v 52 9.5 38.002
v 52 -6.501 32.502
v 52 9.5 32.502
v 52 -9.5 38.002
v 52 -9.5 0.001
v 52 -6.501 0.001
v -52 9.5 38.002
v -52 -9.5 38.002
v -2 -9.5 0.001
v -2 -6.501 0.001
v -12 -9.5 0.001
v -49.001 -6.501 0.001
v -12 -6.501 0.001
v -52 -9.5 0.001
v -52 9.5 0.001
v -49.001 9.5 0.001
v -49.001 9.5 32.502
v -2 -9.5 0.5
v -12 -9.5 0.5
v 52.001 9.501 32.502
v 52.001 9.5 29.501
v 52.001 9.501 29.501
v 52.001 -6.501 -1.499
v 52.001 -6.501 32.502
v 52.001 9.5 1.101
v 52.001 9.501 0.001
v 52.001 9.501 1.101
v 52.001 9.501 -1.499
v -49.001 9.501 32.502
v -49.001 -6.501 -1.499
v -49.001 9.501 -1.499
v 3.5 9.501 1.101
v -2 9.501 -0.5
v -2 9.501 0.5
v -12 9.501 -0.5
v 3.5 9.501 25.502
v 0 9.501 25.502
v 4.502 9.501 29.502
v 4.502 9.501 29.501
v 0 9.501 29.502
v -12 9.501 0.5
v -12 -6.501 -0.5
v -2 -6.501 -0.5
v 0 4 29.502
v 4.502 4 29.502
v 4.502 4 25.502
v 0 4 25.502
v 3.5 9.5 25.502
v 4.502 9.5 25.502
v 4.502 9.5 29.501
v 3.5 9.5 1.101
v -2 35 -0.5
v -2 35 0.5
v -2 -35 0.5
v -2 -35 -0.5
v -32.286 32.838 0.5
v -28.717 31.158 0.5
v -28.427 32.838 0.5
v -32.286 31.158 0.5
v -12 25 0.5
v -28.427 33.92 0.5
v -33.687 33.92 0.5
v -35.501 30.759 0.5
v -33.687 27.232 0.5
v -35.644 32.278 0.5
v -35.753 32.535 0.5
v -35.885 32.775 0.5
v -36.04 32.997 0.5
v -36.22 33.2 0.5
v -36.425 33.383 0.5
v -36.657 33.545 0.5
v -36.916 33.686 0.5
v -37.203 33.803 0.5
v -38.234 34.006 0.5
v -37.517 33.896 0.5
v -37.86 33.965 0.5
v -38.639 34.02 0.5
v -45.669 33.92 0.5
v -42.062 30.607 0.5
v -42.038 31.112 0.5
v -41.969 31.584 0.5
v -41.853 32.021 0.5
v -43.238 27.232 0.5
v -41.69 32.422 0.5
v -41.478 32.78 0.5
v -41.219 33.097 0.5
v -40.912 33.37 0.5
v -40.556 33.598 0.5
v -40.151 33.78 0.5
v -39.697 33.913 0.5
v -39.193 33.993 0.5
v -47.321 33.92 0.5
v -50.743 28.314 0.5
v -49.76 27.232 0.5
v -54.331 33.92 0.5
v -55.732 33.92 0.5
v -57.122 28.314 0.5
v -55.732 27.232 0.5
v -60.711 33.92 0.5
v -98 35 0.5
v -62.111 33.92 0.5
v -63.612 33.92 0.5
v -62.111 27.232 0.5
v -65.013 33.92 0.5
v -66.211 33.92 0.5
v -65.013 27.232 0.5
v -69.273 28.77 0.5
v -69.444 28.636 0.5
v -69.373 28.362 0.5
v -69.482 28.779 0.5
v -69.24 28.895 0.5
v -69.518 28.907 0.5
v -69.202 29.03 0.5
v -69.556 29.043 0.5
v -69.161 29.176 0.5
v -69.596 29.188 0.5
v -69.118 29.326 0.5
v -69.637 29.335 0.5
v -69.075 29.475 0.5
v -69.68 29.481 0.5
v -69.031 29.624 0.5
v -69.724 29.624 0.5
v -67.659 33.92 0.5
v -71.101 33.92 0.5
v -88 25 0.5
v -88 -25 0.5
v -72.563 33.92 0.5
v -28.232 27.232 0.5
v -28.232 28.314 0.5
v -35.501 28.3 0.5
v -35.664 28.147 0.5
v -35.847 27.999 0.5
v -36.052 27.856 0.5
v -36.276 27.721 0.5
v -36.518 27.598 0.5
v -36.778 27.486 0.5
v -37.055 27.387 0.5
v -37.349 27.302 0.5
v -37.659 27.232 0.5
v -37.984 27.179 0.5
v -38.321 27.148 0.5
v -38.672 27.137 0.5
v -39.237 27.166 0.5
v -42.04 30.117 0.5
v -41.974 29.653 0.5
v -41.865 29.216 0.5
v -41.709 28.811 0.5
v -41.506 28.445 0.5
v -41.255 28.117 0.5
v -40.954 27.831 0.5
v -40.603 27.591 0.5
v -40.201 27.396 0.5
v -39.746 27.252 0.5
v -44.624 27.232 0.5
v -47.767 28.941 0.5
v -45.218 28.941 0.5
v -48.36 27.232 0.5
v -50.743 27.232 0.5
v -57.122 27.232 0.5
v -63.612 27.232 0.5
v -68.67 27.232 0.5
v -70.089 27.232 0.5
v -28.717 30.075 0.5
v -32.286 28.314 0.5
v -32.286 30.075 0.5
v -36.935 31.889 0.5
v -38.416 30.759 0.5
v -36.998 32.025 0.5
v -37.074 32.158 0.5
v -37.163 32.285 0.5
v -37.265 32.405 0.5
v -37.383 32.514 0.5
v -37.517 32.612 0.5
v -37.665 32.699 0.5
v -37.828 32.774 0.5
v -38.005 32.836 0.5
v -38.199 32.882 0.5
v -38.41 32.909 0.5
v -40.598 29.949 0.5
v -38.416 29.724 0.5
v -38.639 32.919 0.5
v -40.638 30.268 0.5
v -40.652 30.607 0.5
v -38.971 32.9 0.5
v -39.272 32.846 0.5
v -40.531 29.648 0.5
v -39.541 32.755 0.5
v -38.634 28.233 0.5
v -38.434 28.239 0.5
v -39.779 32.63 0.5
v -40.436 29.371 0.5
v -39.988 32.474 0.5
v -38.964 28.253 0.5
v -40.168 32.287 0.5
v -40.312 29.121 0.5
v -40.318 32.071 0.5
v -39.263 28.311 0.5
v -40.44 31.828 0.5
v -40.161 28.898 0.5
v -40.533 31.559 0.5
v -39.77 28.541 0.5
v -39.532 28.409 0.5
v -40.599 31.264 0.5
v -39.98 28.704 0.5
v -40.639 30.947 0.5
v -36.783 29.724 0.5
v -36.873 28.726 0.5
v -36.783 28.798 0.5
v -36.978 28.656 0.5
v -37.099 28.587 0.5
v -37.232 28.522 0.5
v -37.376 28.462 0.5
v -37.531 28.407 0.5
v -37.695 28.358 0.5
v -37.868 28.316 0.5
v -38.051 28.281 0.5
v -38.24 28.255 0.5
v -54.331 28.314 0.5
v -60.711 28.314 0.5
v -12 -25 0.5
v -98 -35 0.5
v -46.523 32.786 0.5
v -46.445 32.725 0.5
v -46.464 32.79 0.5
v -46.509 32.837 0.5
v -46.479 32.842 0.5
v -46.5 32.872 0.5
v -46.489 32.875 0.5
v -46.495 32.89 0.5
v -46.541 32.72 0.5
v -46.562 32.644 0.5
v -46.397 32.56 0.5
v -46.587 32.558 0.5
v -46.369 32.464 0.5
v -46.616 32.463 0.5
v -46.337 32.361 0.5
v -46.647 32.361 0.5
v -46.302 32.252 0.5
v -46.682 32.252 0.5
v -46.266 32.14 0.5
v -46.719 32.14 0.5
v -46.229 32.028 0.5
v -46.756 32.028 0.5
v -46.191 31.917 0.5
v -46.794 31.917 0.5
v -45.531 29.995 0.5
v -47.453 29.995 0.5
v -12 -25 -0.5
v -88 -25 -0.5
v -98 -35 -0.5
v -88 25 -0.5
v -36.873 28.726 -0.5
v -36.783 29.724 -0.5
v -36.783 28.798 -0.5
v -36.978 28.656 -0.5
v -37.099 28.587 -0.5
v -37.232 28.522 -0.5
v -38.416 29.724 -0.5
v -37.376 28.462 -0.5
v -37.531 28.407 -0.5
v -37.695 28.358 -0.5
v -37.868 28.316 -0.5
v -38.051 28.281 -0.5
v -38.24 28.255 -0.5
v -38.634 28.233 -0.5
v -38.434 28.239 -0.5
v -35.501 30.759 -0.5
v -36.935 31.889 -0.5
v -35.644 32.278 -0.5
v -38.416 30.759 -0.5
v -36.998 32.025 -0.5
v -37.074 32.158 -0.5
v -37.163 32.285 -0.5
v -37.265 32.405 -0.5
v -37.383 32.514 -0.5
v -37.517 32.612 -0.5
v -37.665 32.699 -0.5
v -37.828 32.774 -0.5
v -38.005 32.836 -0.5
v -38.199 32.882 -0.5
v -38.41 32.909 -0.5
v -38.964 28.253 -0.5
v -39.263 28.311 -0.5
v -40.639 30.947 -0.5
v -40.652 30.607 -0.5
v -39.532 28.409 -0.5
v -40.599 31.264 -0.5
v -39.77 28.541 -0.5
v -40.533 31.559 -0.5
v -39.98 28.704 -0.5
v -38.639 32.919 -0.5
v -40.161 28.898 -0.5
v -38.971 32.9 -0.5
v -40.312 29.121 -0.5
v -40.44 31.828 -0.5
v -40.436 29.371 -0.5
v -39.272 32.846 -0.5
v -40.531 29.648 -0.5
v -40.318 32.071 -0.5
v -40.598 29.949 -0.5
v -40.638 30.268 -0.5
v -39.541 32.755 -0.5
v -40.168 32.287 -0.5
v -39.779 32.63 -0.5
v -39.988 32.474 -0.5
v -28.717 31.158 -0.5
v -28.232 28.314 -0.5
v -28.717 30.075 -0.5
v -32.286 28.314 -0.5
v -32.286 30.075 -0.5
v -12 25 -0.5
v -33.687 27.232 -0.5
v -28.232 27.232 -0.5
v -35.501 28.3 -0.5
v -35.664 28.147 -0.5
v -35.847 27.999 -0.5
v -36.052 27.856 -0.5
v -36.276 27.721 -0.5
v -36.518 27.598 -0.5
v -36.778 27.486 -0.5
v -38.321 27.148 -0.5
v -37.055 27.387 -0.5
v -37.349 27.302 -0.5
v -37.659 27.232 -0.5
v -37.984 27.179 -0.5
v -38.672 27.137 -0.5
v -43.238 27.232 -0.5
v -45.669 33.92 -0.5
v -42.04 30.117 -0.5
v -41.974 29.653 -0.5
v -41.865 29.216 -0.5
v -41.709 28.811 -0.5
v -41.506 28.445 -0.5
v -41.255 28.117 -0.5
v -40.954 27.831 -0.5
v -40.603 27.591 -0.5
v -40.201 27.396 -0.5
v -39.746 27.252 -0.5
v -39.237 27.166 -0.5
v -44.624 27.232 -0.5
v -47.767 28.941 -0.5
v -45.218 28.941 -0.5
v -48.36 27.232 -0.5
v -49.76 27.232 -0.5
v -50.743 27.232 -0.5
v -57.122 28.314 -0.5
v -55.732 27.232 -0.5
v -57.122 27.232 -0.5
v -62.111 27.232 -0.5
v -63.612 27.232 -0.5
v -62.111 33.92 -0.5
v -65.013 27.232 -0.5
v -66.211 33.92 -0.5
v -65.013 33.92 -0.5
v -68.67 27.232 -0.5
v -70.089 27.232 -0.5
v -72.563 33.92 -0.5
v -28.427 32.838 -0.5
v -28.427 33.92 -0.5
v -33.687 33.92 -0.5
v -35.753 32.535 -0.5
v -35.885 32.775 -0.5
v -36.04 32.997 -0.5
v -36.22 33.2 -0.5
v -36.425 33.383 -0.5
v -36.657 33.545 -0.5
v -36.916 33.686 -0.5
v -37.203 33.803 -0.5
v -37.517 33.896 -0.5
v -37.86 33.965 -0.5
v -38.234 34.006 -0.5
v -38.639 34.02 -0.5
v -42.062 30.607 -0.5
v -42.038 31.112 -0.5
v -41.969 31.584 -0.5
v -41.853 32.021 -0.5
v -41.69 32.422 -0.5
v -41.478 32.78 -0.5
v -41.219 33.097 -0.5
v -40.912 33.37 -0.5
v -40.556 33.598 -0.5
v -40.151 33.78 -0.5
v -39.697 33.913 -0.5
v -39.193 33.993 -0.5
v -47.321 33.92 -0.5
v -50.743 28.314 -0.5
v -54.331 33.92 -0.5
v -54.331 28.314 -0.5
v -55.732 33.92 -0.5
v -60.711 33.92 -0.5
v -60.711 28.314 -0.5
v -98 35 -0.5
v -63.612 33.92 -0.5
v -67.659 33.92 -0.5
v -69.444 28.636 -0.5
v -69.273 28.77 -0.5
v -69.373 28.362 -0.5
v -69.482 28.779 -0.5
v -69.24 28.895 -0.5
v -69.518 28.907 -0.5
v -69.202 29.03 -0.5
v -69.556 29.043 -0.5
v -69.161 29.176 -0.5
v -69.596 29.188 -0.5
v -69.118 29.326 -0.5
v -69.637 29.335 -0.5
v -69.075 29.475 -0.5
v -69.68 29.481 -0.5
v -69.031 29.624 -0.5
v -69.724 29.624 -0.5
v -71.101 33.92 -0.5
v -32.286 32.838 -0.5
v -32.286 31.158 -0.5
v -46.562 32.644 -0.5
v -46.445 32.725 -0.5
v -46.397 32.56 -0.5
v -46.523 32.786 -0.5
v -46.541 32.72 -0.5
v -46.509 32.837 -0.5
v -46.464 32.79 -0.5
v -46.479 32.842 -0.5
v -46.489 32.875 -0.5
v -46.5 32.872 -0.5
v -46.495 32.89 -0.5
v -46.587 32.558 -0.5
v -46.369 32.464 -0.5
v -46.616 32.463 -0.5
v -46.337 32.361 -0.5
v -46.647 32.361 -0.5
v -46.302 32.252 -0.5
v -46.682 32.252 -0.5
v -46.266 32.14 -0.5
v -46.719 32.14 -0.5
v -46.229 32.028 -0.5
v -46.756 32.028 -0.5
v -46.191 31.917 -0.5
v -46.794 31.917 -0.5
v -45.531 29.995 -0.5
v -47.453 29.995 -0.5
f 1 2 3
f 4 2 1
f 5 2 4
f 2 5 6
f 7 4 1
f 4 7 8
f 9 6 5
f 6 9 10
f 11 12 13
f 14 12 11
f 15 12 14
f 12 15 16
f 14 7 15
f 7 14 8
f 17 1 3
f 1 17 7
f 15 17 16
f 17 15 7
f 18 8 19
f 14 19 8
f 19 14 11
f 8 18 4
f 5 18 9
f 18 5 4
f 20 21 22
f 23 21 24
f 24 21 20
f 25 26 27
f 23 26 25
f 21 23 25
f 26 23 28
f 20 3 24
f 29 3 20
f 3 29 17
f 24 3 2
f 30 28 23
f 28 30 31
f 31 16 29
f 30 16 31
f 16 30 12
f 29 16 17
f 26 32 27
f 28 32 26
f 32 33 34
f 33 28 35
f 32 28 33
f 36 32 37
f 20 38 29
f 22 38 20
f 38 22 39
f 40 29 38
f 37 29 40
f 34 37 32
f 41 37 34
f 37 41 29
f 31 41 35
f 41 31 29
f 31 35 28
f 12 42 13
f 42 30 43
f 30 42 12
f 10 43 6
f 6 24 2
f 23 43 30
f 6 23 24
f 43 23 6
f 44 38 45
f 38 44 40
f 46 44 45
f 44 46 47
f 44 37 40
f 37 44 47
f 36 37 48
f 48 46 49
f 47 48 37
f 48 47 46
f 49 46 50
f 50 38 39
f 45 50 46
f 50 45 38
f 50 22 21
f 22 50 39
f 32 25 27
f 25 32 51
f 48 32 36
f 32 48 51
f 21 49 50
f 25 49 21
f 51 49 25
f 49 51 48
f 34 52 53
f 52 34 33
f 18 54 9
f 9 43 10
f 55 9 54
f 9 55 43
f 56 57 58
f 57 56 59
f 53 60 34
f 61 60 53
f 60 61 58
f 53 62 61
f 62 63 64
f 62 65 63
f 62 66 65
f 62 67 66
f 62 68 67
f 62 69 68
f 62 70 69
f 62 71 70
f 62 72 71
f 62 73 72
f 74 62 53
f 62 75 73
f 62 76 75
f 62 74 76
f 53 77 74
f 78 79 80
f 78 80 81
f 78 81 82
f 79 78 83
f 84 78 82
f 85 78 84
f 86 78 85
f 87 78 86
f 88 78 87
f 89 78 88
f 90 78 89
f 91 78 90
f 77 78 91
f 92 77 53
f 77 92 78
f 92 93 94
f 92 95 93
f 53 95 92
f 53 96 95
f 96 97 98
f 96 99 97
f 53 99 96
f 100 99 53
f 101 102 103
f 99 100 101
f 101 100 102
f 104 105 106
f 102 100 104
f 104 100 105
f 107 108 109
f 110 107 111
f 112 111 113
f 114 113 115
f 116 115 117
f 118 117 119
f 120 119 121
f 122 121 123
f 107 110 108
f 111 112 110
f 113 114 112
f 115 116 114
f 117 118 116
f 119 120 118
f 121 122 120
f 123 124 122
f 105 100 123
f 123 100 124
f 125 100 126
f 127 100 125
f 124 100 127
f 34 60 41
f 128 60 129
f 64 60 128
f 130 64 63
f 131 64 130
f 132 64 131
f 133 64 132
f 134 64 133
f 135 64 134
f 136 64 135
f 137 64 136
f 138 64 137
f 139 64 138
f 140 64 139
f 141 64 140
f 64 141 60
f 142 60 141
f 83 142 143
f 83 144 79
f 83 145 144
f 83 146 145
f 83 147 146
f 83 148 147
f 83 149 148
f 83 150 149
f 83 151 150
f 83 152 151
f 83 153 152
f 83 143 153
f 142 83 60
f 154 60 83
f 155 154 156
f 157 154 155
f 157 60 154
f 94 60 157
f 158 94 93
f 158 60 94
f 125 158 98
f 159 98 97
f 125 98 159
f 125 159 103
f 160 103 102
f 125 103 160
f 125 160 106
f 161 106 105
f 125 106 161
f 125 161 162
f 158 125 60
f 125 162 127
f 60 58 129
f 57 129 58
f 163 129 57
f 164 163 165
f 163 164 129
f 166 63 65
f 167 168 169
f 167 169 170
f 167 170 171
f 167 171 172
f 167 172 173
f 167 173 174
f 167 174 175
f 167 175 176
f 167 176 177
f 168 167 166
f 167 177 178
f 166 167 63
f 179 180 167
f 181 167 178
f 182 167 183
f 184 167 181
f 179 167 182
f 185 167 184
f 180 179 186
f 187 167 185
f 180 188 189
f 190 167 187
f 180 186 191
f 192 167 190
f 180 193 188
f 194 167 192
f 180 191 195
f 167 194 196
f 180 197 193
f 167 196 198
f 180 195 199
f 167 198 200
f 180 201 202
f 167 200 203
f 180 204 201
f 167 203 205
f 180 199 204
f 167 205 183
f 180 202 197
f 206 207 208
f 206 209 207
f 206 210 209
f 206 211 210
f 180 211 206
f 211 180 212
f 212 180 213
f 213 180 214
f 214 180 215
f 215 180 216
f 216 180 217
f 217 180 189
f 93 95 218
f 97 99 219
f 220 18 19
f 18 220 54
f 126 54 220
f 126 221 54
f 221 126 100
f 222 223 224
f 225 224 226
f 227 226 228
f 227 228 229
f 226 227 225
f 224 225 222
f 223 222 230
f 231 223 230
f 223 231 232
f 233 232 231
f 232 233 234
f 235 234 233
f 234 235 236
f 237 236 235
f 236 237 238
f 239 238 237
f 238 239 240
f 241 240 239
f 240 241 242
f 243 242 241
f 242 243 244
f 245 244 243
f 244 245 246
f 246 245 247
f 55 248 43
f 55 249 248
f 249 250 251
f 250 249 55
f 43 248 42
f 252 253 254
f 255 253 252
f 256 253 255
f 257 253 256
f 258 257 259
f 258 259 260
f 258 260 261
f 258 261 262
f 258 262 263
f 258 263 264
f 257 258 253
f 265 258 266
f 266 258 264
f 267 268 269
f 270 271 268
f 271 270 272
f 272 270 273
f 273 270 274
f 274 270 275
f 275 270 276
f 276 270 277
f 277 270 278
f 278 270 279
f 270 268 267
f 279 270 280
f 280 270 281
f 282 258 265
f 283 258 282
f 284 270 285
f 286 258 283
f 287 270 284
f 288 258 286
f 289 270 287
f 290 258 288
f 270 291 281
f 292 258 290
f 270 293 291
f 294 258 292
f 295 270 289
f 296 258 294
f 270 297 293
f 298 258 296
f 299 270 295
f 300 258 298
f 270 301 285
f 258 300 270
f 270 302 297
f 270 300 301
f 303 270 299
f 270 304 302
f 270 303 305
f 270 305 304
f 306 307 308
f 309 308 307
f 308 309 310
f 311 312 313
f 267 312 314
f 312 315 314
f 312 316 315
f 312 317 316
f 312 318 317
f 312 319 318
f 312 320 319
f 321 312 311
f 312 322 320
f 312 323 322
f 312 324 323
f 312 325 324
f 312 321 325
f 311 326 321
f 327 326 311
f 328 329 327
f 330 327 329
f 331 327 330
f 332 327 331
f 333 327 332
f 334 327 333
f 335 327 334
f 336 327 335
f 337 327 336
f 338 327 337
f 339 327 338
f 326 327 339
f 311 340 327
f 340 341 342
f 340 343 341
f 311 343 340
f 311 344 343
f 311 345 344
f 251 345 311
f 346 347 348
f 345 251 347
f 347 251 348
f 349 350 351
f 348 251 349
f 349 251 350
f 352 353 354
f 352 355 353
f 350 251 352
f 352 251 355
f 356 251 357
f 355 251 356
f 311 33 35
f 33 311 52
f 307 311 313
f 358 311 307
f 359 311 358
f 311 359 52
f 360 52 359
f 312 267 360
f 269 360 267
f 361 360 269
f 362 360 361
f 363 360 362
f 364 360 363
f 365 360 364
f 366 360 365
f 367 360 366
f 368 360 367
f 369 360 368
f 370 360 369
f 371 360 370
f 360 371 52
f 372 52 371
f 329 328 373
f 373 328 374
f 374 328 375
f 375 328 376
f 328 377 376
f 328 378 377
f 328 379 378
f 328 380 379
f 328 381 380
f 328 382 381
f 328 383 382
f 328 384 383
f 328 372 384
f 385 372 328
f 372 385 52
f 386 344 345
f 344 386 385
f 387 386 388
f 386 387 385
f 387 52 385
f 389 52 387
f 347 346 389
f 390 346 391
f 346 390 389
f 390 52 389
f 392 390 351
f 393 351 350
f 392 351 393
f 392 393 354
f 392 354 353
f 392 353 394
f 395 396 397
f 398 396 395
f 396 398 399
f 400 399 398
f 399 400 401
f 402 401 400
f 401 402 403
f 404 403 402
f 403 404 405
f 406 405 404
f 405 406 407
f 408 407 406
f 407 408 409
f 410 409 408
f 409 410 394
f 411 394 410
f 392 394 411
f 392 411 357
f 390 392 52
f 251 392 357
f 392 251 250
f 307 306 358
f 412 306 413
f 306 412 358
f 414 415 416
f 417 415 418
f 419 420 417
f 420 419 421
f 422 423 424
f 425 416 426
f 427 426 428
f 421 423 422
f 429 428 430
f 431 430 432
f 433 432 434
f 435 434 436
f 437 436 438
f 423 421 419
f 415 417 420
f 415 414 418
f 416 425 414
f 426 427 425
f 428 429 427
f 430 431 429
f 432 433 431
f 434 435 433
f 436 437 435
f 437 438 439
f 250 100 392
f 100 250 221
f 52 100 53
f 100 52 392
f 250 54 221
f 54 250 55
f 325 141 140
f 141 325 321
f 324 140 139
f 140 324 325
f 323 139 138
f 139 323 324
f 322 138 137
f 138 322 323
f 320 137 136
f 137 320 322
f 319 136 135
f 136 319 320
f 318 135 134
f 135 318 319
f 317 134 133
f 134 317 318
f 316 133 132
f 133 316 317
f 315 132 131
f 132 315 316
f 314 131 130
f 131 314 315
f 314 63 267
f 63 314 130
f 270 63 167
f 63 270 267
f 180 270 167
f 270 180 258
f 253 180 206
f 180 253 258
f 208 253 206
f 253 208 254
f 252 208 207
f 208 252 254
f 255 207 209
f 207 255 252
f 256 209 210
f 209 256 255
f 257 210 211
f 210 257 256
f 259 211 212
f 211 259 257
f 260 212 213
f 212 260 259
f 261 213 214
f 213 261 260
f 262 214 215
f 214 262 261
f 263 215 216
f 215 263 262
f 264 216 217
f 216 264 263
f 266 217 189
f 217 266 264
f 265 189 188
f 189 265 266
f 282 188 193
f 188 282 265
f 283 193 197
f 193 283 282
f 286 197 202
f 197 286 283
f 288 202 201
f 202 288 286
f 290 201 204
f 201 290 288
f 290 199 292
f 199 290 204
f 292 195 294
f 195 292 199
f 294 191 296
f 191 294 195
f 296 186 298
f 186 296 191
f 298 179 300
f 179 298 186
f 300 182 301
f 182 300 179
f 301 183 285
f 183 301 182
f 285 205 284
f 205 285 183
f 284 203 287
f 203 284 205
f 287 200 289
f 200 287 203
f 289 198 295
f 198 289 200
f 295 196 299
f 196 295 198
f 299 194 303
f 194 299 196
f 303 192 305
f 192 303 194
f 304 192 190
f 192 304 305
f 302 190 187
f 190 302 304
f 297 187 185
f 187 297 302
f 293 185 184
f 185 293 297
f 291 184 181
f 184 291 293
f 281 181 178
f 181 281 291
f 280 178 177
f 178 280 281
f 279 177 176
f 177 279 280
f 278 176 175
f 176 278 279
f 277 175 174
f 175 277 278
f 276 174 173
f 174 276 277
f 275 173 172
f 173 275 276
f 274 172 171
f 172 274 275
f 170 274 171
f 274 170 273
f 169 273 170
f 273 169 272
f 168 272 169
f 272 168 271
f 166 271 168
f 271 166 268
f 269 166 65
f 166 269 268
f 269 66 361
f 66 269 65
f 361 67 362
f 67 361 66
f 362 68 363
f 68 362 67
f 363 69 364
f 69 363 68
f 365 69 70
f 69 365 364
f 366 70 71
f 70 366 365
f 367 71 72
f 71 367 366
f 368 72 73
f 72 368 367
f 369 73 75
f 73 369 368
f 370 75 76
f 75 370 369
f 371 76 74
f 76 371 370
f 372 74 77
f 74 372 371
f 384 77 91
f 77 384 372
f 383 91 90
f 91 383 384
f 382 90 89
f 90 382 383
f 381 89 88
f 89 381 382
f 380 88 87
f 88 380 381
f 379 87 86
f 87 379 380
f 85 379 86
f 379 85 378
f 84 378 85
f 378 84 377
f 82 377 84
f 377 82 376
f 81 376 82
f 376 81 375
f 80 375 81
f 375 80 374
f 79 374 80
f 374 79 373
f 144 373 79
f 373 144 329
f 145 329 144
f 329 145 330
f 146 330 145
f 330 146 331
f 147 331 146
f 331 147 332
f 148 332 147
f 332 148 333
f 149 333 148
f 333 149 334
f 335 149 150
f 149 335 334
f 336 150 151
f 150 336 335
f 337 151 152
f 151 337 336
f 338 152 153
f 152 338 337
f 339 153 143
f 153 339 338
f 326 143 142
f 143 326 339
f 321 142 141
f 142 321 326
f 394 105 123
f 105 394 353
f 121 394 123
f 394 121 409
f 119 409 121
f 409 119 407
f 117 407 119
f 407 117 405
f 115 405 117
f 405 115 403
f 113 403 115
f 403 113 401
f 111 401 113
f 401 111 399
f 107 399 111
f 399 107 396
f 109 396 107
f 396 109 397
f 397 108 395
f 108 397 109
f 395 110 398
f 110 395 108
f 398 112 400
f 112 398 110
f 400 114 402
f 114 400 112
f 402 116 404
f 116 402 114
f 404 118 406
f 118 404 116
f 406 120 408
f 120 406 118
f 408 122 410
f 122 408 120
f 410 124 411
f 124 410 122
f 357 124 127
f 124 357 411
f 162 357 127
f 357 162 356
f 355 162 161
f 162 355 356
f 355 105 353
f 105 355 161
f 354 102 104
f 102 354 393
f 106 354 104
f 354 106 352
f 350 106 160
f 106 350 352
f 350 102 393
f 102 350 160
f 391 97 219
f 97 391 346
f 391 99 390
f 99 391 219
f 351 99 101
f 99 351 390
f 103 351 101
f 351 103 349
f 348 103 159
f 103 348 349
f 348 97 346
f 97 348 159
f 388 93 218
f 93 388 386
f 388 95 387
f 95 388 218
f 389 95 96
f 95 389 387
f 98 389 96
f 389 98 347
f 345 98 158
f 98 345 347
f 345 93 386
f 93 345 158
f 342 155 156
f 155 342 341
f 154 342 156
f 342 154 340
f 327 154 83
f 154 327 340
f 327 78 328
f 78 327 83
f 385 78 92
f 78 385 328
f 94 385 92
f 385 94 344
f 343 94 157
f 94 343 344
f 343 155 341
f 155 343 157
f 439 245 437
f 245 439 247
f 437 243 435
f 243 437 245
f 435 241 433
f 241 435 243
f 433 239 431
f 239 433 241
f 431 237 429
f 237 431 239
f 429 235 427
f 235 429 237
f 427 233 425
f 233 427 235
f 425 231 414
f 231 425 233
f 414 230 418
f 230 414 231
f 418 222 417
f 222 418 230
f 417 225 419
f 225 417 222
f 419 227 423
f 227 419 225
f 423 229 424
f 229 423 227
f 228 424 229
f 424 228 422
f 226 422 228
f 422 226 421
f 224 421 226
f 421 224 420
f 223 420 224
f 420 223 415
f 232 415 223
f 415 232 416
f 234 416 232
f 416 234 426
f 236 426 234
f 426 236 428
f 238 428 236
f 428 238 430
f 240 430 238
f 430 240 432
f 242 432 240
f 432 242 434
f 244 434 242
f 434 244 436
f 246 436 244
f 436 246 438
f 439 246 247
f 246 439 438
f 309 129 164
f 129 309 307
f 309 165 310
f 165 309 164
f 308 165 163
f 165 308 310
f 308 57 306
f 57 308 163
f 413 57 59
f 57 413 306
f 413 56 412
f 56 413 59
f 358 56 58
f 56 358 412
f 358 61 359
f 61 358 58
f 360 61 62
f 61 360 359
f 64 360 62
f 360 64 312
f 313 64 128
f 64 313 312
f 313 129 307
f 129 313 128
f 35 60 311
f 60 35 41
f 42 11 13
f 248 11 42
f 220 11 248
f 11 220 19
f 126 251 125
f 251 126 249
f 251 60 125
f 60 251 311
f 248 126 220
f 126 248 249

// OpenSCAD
use <BOSL2/std.scad>

use <primitives/prisms.scad>
use <primitives/boxes.scad>

eps=0.001;

//main box params
width = 95;
depth = 10;
wall_thickness = 1.5;
chamfer=2.0;
outer_wall_thickness=wall_thickness;
inner_wall_thickness=outer_wall_thickness*2;

bottom_height =35;
bottom_outer_height=bottom_height;
bottom_inner_height = bottom_outer_height*0.8;

lid_height = 20;
lid_outer_height= lid_height;
lid_inner_height = lid_outer_height*0.8;



//snap fit params
snap_male_width=10;
snap_block_height=3;
snap_block_depth=outer_wall_thickness*1.2;
snap_female_tol=1;


// tdiv: the actual divider with text writting on it
tdiv_thickness = 1;
tdiv_extra_width = 1;
tdiv_tol = max(inner_wall_thickness*.1, 0.5);
tdiv_width = width+tdiv_extra_width;
tdiv_text_height = 7;
tdiv_height = 63 + tdiv_text_height;
tdiv_sidebar_width = 10;

//div: the cutout in the bottom box
div_width = width + tdiv_extra_width + tdiv_tol*2;
div_z_indent = 0.4; //how far into bottom div cuts
div_height = bottom_inner_height+ div_z_indent;
div_thickness = tdiv_thickness + tdiv_tol;

box_bottom(center=false, div_locs=[5]);
//////
//////
////lid
//translate([0, width+wall_thickness*3 + 30, 0]){
//    box_lid(center=false);
//}

translate([-50, 0,0])
divider(text="VILLAGE", width=tdiv_width, height=tdiv_height, thickness=tdiv_thickness, text_height=tdiv_text_height, sidebar_width=tdiv_sidebar_width);




//translate([2.5, 65, 9]){
//cube([1,1,3]);
//}

module box_bottom (center=false, div_locs=[]) { 
 
    outer_height = bottom_outer_height;
    inner_height = bottom_inner_height;
    
    cut_depth = inner_wall_thickness + outer_wall_thickness+2*eps;
    cut_height =  snap_block_height + snap_female_tol ;
    cut_width = snap_male_width + snap_female_tol;
    
    cut_trans_x_left = 0 + cut_depth/2;
    cut_trans_x_right = width + inner_wall_thickness + outer_wall_thickness + cut_depth/2;
    cut_trans_y = depth/2  + inner_wall_thickness + outer_wall_thickness;
    cut_trans_z = inner_height + outer_wall_thickness - cut_height/2 +eps;//inner_height - outer_height/2 - cut_depth/2;
    
    
    center_trans_x = center ? -1*(width/2 + outer_wall_thickness + inner_wall_thickness) : 0;
    center_trans_y = center ? -1*(depth/2 + outer_wall_thickness + inner_wall_thickness) : 0;
    center_trans_z = center ? -1*(height/2 + outer_wall_thickness/2) + eps : eps;

    bottom_full_width = width + 2*(outer_wall_thickness + inner_wall_thickness);
    div_trans_x = bottom_full_width/2 - div_width/2;
    div_trans_y = outer_wall_thickness + inner_wall_thickness;
    div_trans_z = outer_wall_thickness - div_z_indent;

    translate([center_trans_x, center_trans_y, center_trans_z]){
        difference() { 

            open_box_with_lip(width=width, depth=depth, outer_height=outer_height, inner_height=inner_height, outer_wall_thickness=outer_wall_thickness, inner_wall_thickness=inner_wall_thickness, chamfer=chamfer, center=false);

            //cut openings for snap fit
            translate([cut_trans_x_left, cut_trans_y, cut_trans_z]) {
                rotate([0, 0, 90]){
                    cube([cut_width, cut_depth,cut_height], center=true);
                }
            }
            translate([(cut_trans_x_right), cut_trans_y, cut_trans_z]) {
                rotate([0, 0, 90]){
                    cube([cut_width, cut_depth, cut_height ], center=true);
                }
            }
            
            
            for (div_loc = div_locs) {
                translate([div_trans_x, div_trans_y + div_loc, div_trans_z]){
                    cube([div_width, div_thickness, div_height]);
                }
            }
        }
        
    }
}

module div_cuts(div_locs){
    
    
}

module box_lid (height, center=false) {

    outer_height = lid_outer_height;
    inner_height = lid_inner_height;
    
    stem_depth = inner_wall_thickness;
    stem_height = ((lid_outer_height - lid_inner_height) + (bottom_outer_height-bottom_inner_height)) + snap_block_height + snap_female_tol/2;
    
        
    snap_trans_x_left = 0 + outer_wall_thickness + stem_depth/2 -eps;
    snap_trans_x_right = width + inner_wall_thickness + outer_wall_thickness + stem_depth/2 +eps;
    snap_trans_y = depth/2  + inner_wall_thickness + outer_wall_thickness;
    snap_trans_z = inner_height + outer_wall_thickness  +  stem_height/2 - eps; 
    
    
    center_trans_x = center ? -1*(width/2 + outer_wall_thickness + inner_wall_thickness) : 0;
    center_trans_y = center ? -1*(depth/2 + outer_wall_thickness + inner_wall_thickness) : 0;
    center_trans_z = center ? -1*(height/2 + outer_wall_thickness/2) : 0;

    translate([center_trans_x, center_trans_y, center_trans_z]){
        union(){
            open_box_with_lip(width=width, depth=depth, outer_height=outer_height, inner_height=inner_height, outer_wall_thickness=outer_wall_thickness, inner_wall_thickness=inner_wall_thickness, chamfer=chamfer);

            translate([snap_trans_x_left, snap_trans_y, snap_trans_z]){
                rotate([0, 0, 90])
                snap_fit_male(width=snap_male_width, stem_height=stem_height, stem_depth=stem_depth, block_height=snap_block_height, block_depth=snap_block_depth);
            }
            translate([snap_trans_x_right, snap_trans_y ,snap_trans_z]){
                rotate([0, 0, -90])
                snap_fit_male(width=snap_male_width, stem_height=stem_height, stem_depth=stem_depth, block_height=snap_block_height, block_depth=snap_block_depth);
            }
        
        } 
    }
} 
   

module snap_fit_male(width, stem_height, stem_depth, block_height, block_depth){

union() {
    //stem
    cube([width, stem_depth, stem_height], center=true);

    translate([0, block_depth/2 + stem_depth/2 - eps, stem_height/2 - block_height/2]){
        rotate([0,0,90])
        rotate([0, 90, 0])
            trapezoid_prism(width_lower=block_height, width_upper=block_height/2, depth=width, height=block_depth, center=true, square_right=true);
    }
}
}


module divider(text, width, height, thickness, text_height, sidebar_width) {
    div_width = width;
    div_height = height;
    div_thickness = thickness;
    text_height=text_height;
    div_sidebar_width = sidebar_width;
    
    
    text_thickness = div_thickness*1.1; //div_thickness/2;
    text_buffer = max(1.0, text_height/10);
    text_spacing = max(1.1, 1 + text_buffer/10);
    
    
    
    empty_width = div_width - div_sidebar_width*2;
    empty_height = div_height - max(text_height + text_buffer*2, div_sidebar_width)*2;
    
    text_trans_y = div_height/2 - text_height/2 - text_buffer;
    text_trans_z = text_thickness/2 * -1;

    difference() {
        cube([div_width,div_height,div_thickness], center=true);
        translate([0, text_trans_y, text_trans_z]){
            linear_extrude(text_thickness)
            text(text, size=text_height, font="Helvetica:style=Bold", halign="center", valign="center", spacing=text_spacing);
        }
        cube([empty_width, empty_height, div_thickness], center=true);
    }
    
}
